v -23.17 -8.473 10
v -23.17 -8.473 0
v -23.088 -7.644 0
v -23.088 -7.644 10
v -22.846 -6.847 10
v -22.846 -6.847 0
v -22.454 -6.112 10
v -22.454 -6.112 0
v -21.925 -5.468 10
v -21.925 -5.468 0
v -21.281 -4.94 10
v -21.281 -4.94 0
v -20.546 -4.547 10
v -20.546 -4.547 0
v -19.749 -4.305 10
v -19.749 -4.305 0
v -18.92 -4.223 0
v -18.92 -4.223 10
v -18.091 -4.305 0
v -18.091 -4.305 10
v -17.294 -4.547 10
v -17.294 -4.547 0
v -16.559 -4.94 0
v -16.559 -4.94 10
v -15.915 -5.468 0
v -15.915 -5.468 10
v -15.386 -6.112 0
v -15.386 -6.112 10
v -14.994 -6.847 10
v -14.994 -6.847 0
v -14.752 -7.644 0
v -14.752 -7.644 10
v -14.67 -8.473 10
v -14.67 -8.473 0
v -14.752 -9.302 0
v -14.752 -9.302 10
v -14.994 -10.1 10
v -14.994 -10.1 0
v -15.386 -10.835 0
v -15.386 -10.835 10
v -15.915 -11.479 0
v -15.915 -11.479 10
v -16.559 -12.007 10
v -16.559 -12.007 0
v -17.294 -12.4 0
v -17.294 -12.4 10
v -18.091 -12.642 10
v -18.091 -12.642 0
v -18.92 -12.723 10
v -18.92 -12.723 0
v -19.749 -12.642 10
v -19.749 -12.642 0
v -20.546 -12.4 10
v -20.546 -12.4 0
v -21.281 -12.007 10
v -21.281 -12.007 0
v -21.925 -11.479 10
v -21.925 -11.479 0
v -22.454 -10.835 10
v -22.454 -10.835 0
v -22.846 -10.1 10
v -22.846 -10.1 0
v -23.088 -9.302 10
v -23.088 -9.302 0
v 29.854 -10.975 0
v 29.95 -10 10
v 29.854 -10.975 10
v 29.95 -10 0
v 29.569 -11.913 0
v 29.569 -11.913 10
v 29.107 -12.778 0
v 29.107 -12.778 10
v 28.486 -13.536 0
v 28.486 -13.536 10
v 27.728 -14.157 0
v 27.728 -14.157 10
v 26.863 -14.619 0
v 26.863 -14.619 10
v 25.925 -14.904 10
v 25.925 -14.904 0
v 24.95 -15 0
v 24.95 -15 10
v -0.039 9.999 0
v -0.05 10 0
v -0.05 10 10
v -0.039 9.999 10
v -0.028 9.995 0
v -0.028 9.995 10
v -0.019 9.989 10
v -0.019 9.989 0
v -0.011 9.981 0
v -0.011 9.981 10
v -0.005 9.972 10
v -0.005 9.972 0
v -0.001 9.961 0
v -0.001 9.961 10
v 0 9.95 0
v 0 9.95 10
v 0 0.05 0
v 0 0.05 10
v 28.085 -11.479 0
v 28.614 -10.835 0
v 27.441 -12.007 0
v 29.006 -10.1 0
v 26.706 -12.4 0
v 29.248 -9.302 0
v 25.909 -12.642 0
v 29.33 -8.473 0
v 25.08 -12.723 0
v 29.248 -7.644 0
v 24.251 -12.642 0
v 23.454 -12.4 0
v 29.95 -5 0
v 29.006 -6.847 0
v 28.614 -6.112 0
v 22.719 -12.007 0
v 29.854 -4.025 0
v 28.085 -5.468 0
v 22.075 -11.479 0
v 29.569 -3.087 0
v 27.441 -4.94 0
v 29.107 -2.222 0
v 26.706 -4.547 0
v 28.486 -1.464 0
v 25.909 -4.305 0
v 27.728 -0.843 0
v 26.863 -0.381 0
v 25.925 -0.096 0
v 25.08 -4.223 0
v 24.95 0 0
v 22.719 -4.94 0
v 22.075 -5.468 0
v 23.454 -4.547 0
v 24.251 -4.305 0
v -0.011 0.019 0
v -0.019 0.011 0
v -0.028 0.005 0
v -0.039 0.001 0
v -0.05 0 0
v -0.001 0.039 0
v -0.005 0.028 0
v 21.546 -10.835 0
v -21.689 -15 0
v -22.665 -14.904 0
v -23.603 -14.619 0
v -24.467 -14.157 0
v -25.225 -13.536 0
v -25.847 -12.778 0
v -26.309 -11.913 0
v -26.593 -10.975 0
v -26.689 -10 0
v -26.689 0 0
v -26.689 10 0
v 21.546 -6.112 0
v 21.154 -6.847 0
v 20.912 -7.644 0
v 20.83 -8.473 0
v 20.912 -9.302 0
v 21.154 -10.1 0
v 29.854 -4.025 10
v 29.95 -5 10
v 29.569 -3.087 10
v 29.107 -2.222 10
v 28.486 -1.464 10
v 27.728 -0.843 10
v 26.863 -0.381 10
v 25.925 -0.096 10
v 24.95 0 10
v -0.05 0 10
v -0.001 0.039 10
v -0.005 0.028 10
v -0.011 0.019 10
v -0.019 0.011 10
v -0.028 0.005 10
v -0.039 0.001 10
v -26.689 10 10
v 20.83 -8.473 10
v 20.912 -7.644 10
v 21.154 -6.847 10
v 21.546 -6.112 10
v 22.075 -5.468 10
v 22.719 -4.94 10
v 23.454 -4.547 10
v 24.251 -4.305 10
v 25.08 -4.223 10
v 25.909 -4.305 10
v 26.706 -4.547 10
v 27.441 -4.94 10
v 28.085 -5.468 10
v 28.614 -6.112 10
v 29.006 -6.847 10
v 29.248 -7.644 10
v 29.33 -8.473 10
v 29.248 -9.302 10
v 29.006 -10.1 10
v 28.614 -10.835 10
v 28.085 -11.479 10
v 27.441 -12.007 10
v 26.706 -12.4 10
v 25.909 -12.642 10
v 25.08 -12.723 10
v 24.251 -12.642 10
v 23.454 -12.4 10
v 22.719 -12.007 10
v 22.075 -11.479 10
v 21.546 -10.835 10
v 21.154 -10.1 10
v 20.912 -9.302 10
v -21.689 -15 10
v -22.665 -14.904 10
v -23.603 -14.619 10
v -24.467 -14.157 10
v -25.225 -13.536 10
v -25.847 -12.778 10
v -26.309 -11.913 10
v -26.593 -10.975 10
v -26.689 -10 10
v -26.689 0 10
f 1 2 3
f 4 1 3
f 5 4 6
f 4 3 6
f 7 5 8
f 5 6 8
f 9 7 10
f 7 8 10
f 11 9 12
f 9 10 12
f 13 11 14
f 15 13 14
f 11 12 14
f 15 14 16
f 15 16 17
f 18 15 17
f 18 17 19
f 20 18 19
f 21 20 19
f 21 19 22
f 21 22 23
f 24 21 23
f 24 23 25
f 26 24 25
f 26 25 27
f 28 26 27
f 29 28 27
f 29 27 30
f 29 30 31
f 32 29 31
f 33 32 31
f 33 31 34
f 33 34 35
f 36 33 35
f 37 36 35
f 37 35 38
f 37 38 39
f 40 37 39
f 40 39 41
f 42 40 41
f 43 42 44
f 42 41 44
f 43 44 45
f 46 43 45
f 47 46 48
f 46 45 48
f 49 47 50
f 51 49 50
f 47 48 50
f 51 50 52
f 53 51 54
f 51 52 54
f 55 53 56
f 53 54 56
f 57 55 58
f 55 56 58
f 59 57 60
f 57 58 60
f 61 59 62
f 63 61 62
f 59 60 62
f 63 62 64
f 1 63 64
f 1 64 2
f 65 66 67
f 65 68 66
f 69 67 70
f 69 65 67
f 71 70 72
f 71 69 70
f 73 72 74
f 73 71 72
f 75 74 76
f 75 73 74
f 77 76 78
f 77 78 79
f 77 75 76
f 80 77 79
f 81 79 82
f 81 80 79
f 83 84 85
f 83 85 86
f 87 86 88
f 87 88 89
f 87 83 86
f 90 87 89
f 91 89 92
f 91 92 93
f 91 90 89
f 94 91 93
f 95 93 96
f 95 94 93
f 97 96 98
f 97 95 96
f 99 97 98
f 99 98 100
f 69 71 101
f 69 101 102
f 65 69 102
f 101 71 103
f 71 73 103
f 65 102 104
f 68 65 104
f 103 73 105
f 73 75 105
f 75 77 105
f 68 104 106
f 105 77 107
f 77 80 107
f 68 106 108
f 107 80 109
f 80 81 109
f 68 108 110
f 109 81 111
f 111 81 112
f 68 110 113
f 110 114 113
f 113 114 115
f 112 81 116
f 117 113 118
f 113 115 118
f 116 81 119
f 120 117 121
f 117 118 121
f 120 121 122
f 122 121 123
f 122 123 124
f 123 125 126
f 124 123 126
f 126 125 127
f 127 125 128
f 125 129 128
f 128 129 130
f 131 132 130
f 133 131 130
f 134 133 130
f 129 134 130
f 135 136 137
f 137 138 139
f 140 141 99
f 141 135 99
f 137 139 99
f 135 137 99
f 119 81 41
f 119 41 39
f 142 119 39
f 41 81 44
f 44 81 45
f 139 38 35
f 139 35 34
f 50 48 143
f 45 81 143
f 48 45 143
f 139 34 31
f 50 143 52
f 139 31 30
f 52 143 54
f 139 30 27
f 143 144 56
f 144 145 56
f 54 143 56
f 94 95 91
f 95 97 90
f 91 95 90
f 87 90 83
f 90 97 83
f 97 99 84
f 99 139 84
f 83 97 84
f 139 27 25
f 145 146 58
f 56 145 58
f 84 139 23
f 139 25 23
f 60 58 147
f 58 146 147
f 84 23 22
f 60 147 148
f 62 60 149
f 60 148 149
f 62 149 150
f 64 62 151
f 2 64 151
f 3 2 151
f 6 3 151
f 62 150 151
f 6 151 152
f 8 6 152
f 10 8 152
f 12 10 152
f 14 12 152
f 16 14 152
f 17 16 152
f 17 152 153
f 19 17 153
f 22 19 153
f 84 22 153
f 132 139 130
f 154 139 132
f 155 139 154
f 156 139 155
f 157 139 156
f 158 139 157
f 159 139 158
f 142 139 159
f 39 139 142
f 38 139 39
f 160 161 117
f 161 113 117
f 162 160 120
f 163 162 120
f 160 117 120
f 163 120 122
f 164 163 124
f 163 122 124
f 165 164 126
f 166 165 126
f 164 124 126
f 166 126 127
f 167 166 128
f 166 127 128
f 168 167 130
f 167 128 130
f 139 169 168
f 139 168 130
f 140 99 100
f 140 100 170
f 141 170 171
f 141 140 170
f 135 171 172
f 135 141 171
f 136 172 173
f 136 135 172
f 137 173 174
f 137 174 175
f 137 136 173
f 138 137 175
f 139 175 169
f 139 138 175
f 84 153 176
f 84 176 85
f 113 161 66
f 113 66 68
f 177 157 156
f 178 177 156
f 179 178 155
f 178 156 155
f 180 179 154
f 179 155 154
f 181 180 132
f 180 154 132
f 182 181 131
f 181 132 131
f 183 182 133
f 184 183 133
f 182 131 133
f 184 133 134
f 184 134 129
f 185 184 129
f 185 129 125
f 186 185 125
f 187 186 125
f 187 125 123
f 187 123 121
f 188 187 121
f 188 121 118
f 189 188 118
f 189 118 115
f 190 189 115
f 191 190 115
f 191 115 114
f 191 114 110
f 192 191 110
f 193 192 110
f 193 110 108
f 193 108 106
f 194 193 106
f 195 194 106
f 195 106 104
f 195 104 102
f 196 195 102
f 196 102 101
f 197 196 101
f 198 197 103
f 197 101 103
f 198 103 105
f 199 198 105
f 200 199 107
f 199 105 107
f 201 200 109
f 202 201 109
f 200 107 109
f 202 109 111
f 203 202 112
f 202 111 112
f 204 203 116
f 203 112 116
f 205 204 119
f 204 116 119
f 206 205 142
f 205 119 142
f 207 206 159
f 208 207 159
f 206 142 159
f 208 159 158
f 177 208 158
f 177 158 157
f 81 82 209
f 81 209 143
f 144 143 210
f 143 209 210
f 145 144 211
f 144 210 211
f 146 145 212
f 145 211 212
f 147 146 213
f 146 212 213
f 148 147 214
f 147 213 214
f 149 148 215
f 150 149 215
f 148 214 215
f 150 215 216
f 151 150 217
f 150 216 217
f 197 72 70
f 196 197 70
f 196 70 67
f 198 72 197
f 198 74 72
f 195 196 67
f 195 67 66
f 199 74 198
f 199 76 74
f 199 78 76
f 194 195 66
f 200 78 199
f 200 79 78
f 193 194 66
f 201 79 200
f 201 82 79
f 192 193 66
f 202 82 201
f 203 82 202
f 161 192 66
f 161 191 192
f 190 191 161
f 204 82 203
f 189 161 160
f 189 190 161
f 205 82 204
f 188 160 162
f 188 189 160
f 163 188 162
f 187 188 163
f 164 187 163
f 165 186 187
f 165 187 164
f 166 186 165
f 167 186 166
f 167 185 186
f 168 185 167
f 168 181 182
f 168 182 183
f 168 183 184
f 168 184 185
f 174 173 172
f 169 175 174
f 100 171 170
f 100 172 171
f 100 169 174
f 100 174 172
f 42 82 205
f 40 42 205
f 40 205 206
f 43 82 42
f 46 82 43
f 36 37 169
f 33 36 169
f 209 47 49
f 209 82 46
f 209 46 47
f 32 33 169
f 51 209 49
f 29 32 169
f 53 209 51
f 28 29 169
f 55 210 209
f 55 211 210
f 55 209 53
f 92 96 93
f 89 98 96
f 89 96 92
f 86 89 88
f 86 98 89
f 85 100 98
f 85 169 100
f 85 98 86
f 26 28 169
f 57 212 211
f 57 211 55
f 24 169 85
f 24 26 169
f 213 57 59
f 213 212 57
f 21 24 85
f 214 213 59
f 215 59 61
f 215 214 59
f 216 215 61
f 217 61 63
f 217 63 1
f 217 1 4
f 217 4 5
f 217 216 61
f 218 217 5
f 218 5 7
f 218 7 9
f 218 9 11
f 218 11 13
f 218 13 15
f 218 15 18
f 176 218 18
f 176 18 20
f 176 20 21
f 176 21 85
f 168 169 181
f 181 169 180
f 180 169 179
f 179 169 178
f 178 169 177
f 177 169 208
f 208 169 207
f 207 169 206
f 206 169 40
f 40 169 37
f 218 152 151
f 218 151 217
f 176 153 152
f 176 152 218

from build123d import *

# Parameters (mm, degrees)
RESSALTO_EXTRUS_O1_DEPTH = 10
ESBO_O2_W                = 26.639233333
ESBO_O2_H                = 10
RESSALTO_EXTRUS_O2_DEPTH = 15
ESBO_O3_W                = 10
ESBO_O3_H                = 15
RESSALTO_EXTRUS_O3_DEPTH = 30
ESBO_O4_R                = 4.25
CORTE_EXTRUS_O1_DEPTH    = 30
FILETE1_R                = 5


with BuildPart() as part:
    # Esboço1 → Ressalto-extrusão1 (new body)
    with BuildSketch(Plane.XY):
        with BuildLine():
            Line((-26.689233333, 0), (-26.689233333, 10))
            Line((-26.689233333, 10), (-0.05, 10))
            ThreePointArc((-0.05, 10), (-0.014644661, 9.985355339), (0, 9.95))
            Line((0, 9.95), (0, 0.05))
            ThreePointArc((0, 0.05), (-0.014644661, 0.014644661), (-0.05, 0))
            Line((-0.05, 0), (-26.689233333, 0))
        make_face()
    extrude(amount=RESSALTO_EXTRUS_O1_DEPTH)

    # Esboço2 → Ressalto-extrusão2 (add)
    with BuildSketch(Plane.XZ):
        with Locations((-13.369616667, 5)):
            Rectangle(ESBO_O2_W, ESBO_O2_H)
    extrude(amount=RESSALTO_EXTRUS_O2_DEPTH)

    # Esboço3 → Ressalto-extrusão3 (add)
    with BuildSketch(Plane(origin=(-0.05, 0, 0), x_dir=(0, 0, -1), z_dir=(1, 0, 0))):
        with Locations((-5, -7.5)):
            Rectangle(ESBO_O3_W, ESBO_O3_H)
    extrude(amount=RESSALTO_EXTRUS_O3_DEPTH)

    # Esboço4 → Corte-extrusão1 (cut)
    with BuildSketch(Plane(origin=(0, 0, 0), x_dir=(-1, 0, 0), z_dir=(0, 0, -1))):
        with Locations((-25.08, -8.473337784)):
            Circle(ESBO_O4_R)
        with Locations((18.92, -8.473337784)):
            Circle(ESBO_O4_R)
    extrude(amount=-CORTE_EXTRUS_O1_DEPTH, mode=Mode.SUBTRACT)

    # Filete1
    filete1_edges = [part.edges().sort_by_distance(p)[0] for p in [
        (-26.689233333, -15, 5),
        (29.95, 0, 5),
        (29.95, -15, 5),
    ]]
    fillet(filete1_edges, radius=FILETE1_R)


solid = part.part
